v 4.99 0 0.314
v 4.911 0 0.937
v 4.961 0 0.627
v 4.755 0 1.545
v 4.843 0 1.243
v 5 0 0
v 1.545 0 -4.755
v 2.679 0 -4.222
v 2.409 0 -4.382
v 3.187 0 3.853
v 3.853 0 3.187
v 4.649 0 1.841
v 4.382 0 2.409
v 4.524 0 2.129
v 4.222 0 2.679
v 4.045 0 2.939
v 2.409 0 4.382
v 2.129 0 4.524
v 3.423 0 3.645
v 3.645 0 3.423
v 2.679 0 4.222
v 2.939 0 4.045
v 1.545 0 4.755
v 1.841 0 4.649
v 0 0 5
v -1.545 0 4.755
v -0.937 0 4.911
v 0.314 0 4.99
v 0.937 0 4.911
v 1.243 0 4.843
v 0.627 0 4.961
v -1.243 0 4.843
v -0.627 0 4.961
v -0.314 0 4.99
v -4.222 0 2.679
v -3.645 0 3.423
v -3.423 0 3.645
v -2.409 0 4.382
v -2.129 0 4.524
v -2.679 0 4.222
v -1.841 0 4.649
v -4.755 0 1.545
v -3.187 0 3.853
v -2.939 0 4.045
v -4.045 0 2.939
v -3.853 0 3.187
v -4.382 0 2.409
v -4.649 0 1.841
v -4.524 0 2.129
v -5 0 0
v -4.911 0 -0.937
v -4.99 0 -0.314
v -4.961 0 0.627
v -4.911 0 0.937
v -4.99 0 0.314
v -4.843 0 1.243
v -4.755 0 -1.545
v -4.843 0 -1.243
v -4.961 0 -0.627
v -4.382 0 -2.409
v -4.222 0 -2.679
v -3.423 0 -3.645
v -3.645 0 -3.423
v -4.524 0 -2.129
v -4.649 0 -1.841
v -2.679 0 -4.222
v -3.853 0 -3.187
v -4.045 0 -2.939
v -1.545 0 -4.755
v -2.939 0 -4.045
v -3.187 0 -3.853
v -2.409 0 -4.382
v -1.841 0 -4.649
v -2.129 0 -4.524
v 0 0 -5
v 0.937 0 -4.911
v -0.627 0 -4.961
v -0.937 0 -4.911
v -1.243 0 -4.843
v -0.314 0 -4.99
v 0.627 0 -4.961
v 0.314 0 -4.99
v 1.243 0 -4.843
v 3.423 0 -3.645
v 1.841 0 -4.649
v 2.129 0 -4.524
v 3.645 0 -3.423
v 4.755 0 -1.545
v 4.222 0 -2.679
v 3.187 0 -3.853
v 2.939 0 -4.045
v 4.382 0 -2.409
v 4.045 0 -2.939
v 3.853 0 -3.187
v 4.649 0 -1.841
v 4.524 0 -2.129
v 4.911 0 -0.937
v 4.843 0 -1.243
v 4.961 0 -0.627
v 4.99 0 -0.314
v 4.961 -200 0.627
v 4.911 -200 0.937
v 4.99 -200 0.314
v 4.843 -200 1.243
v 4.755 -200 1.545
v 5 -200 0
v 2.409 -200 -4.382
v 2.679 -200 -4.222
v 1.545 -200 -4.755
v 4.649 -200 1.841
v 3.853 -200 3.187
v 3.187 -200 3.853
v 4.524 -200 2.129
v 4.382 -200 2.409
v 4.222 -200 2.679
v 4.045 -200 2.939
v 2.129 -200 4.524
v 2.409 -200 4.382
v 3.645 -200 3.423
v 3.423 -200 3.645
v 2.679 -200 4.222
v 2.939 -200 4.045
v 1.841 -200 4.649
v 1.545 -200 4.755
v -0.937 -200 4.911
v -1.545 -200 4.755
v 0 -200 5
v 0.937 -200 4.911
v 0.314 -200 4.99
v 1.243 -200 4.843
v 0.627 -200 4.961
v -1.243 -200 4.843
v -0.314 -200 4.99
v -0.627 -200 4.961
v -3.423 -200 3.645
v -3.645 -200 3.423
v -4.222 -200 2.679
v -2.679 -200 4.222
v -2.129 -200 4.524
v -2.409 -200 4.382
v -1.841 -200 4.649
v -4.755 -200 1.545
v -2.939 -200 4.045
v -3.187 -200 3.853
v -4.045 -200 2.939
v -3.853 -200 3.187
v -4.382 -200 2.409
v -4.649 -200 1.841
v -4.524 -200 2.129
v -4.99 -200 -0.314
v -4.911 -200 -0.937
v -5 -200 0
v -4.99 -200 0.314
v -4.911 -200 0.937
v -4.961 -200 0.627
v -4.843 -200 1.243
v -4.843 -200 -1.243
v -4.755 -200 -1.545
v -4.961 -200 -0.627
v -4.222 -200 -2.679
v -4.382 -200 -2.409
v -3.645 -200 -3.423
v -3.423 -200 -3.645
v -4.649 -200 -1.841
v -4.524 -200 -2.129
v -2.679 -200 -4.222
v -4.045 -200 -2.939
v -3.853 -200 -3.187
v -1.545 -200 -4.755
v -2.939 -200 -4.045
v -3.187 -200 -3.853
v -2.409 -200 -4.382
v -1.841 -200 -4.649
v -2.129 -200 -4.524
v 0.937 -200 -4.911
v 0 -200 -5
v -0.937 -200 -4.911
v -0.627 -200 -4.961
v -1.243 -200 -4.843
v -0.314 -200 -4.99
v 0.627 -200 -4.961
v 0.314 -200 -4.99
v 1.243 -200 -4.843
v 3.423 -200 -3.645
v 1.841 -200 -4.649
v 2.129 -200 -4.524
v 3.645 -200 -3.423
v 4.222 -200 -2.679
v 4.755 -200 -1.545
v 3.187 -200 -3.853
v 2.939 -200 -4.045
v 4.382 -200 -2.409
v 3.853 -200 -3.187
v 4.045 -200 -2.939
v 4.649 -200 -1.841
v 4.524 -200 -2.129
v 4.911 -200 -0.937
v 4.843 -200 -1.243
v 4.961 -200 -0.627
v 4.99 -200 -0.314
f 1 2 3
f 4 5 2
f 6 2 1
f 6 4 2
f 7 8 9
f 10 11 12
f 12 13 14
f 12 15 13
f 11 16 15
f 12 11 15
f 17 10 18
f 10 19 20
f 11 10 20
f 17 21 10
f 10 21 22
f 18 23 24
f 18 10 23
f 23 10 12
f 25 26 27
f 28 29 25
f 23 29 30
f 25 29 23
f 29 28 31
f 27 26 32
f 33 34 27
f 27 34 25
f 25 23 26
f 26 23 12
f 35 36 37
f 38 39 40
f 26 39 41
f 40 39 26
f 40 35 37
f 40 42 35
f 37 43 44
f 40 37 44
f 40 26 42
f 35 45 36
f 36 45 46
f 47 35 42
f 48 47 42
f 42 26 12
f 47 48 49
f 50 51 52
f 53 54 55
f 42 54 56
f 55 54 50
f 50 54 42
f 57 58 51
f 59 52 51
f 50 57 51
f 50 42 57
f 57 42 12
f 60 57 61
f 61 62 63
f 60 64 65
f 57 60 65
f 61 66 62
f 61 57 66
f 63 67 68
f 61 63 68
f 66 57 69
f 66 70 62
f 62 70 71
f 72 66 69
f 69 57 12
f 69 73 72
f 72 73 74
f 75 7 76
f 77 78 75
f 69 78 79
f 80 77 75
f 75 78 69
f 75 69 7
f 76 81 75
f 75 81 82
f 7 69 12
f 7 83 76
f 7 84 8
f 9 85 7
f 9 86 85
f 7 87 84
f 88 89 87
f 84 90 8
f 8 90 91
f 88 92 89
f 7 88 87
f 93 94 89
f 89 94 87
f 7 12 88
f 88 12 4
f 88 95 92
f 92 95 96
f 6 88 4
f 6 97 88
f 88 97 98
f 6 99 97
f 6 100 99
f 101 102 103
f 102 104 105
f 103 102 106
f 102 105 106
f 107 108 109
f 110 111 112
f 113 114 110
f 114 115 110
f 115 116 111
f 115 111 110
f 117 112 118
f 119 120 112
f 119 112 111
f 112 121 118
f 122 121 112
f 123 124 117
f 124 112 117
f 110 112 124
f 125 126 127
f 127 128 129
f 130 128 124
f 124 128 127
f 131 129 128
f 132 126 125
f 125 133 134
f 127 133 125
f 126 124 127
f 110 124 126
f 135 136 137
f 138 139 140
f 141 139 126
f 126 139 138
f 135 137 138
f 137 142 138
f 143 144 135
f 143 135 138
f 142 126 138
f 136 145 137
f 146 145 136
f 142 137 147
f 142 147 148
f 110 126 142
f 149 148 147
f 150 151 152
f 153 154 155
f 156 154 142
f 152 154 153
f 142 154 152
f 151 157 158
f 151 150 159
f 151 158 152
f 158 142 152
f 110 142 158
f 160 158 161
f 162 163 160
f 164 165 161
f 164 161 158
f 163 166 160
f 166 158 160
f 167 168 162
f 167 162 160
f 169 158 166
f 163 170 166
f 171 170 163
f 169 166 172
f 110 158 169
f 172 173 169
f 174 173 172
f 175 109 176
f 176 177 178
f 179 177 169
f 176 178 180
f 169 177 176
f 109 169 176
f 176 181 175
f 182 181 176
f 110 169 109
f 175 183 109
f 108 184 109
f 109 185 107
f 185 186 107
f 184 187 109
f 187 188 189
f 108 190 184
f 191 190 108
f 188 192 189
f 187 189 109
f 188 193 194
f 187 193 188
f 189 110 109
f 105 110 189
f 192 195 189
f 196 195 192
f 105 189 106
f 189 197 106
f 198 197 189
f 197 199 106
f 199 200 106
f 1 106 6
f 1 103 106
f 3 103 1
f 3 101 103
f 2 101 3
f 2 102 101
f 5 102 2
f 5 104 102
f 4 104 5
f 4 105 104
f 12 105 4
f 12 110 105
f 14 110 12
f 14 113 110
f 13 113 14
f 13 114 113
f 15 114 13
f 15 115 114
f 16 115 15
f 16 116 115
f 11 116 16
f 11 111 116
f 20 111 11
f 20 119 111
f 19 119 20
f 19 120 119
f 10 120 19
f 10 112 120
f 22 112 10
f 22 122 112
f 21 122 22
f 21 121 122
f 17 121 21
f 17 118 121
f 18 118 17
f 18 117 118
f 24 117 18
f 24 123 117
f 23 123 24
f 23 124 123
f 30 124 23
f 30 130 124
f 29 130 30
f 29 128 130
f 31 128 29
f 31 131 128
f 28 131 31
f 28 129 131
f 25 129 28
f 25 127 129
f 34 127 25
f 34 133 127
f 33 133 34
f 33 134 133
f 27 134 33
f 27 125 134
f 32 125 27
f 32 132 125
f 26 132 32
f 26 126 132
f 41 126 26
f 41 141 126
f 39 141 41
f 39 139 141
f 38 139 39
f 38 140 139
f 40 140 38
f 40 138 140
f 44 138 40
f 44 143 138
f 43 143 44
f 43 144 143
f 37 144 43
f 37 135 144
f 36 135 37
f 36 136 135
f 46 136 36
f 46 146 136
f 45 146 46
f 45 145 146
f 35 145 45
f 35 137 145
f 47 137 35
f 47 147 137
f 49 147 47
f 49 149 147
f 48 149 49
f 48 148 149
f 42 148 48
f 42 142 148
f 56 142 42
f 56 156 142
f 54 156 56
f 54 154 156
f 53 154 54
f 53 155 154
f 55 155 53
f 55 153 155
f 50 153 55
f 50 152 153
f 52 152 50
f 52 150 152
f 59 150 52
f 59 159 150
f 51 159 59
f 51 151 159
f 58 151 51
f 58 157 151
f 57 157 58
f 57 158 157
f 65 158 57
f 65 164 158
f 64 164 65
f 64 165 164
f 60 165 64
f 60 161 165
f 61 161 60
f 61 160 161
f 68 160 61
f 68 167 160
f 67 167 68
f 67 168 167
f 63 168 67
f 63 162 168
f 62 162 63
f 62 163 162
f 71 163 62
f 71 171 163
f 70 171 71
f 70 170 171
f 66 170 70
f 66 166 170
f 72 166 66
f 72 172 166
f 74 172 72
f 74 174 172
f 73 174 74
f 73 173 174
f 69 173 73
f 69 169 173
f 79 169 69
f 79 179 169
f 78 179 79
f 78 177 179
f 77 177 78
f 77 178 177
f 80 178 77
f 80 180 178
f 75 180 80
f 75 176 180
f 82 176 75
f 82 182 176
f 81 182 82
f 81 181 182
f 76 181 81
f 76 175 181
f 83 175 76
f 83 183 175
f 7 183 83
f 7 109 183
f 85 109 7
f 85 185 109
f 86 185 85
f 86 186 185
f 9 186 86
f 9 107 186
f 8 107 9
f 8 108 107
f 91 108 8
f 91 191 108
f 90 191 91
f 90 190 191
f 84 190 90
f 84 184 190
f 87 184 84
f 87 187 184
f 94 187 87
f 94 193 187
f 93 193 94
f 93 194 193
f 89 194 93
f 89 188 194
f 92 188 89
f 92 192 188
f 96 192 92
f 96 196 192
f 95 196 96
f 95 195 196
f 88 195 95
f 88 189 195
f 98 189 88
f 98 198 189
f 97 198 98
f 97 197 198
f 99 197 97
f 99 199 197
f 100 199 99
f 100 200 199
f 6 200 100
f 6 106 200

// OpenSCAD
// Config {{{

// filename: stick-v{version}

// }}}

$fn = 100;

rotate([ 90, 0, 0 ]) linear_extrude(height = 200) circle(d = 10);
